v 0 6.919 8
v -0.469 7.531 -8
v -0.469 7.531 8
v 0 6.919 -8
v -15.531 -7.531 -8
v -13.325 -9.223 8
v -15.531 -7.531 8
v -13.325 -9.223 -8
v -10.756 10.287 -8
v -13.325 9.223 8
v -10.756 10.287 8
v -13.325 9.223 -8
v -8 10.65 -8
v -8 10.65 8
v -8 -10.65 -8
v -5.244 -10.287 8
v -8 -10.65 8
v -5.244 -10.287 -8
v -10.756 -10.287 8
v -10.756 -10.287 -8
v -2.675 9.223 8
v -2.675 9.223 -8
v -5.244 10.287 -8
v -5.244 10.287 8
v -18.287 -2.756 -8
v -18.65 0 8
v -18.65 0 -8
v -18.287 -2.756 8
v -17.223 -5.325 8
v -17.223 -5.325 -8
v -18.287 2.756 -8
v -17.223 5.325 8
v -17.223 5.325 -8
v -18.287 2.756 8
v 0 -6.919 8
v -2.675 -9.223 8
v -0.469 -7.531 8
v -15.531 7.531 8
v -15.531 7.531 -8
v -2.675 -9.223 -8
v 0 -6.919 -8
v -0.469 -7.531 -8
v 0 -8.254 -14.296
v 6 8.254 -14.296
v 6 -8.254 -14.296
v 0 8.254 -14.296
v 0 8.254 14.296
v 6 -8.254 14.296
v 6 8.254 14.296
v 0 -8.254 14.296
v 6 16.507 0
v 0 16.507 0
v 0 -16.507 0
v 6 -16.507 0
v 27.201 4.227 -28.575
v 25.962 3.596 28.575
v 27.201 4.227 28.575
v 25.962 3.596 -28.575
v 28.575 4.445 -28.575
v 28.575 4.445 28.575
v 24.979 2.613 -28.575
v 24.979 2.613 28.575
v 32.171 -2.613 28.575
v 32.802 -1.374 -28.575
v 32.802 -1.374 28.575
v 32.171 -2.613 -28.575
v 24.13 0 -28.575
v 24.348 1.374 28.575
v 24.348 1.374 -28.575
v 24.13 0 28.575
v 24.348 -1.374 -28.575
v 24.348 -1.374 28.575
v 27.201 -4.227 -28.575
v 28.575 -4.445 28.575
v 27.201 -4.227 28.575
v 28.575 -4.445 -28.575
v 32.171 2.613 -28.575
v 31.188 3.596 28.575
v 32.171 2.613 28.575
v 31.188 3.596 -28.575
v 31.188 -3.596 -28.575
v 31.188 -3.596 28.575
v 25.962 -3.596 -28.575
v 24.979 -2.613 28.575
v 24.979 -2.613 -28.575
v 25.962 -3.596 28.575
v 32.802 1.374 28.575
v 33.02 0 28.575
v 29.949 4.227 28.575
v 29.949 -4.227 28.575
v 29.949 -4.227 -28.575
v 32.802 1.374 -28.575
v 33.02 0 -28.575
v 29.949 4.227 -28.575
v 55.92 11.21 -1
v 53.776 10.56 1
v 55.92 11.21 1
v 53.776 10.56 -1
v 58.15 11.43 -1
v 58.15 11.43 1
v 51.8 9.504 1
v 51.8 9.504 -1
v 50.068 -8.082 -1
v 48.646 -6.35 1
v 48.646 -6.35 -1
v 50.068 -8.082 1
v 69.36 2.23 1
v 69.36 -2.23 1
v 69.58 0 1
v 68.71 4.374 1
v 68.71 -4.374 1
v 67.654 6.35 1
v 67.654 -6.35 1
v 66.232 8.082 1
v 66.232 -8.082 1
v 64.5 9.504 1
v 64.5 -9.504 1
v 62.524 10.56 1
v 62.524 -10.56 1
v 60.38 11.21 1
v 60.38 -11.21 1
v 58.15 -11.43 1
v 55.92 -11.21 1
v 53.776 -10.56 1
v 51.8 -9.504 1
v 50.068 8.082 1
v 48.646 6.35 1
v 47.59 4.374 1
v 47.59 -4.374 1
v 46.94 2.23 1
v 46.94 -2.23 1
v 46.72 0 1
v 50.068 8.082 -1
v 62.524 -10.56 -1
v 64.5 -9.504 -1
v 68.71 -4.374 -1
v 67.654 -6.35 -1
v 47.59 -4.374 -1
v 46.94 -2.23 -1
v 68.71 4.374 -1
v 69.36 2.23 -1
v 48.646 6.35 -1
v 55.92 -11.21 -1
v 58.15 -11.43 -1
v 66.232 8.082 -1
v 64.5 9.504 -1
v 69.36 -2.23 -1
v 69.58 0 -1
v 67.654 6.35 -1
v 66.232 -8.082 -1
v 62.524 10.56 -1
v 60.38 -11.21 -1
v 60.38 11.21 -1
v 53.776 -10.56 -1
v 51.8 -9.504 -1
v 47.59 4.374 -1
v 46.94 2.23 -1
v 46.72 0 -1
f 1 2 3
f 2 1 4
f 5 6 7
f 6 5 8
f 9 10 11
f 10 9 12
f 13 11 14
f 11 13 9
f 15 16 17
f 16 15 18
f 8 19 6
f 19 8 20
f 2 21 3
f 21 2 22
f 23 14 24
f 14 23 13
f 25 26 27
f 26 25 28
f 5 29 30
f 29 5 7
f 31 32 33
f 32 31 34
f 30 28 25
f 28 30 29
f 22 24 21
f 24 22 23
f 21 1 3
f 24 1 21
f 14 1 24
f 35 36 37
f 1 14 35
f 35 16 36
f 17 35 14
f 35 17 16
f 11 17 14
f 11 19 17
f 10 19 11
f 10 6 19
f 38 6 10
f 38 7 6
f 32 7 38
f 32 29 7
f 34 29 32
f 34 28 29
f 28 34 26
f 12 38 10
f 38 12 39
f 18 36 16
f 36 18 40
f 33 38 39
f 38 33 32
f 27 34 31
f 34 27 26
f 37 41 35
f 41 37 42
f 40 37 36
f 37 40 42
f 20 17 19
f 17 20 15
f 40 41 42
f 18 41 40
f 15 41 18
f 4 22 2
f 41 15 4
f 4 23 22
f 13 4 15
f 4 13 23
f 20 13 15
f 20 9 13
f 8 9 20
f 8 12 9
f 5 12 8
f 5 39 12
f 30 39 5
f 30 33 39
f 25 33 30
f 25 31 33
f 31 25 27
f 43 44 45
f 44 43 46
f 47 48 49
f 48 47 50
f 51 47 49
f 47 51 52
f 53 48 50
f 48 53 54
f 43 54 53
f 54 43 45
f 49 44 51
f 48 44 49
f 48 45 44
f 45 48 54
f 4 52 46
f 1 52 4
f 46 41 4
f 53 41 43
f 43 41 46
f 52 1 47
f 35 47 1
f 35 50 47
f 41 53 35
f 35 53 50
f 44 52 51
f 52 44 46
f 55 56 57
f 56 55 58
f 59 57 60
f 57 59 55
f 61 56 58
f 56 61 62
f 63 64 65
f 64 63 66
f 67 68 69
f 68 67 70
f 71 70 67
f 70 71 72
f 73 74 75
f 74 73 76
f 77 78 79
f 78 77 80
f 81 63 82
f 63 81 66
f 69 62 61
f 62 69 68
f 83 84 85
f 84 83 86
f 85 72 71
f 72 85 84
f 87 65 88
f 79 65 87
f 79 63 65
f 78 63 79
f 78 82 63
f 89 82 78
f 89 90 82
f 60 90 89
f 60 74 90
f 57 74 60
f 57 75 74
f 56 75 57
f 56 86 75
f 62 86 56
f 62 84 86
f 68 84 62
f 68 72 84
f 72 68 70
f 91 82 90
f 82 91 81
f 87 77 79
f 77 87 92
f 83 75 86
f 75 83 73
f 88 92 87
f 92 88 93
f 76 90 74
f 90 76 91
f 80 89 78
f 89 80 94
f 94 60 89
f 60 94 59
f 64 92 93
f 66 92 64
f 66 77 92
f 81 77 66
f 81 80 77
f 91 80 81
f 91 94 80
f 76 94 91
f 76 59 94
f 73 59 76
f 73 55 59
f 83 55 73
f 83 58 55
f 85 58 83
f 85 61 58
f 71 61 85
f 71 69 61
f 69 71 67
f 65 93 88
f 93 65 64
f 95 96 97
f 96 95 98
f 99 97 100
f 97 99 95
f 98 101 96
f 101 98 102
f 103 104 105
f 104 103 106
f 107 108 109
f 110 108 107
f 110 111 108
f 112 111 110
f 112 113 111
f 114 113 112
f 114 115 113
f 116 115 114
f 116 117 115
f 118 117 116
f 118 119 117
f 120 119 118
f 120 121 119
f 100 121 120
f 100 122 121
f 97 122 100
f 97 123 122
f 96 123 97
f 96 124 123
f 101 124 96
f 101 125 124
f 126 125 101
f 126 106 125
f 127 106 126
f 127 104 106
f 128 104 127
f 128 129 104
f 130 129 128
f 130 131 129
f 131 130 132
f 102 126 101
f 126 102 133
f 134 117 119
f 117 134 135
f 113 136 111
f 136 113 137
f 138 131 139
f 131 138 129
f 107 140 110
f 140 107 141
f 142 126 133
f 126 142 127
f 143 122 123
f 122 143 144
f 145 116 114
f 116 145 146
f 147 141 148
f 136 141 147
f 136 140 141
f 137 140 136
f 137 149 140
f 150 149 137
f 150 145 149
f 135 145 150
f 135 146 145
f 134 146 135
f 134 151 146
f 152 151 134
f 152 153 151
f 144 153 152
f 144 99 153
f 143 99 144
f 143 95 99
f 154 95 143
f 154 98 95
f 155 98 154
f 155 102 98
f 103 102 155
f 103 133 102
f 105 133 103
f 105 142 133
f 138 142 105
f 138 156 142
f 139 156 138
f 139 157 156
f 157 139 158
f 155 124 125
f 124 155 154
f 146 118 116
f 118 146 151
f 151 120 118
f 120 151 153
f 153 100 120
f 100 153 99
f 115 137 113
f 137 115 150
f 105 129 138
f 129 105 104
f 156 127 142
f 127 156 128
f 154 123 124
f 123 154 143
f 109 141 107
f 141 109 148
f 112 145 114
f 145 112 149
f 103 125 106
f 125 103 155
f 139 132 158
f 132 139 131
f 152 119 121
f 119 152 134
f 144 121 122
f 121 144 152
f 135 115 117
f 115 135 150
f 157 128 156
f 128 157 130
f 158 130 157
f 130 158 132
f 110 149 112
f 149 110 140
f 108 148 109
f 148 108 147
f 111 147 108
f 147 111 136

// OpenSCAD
// Auto-generated by scripts/author_from_manifest.py (Phase D.3).
// Source: data/phase_d_manifest.json (sku_intent='tyco-ty3331-sidewall-155f').
// Do not hand-edit — regenerate from the manifest.
//
// @part tyco_ty3331_sidewall_155f
// @kind sprinkler_head
// @category head.sidewall.k56
// @display-name "Tyco TY3331 Horizontal Sidewall K5.6 155°F"
// @mfg tyco_fire_protection
// @mfg-pn TY3331
// @listing UL FM
// @hazard-classes LH OH1
// @price-usd 15.80
// @install-minutes 8
// @crew journeyman
// @k-factor 5.6
// @orientation sidewall
// @response standard
// @temperature 155F
// @param size_in number default=0.5 label="Size" unit="in"
// @port inlet position=[0,0.014,0] direction=[0,1,0] style=NPT_threaded size_in=0.5 role=drop

size_in = 0.5;
k_factor = 5.6;

length_mm   = 57.15;
body_dia_mm = 25.40;
thread_od   = 21.3;
thread_len  = 16;
deflector_d = body_dia_mm * 0.9;

rotate([0,0,90]) union() {
    translate([0, thread_len/2, 0])
        cylinder(h = thread_len, d = thread_od, center = true, $fn = 24);
    translate([0, -3, 0])
        rotate([90, 0, 0])
        cylinder(h = 6, d = thread_od * 1.55, $fn = 6, center = true);
    translate([0, -length_mm/2, 0])
        cylinder(h = length_mm, d = body_dia_mm * 0.35, center = true, $fn = 20);
    translate([0, -length_mm - 1, 0])
        cylinder(h = 2, d = deflector_d, center = true, $fn = 32);
}
